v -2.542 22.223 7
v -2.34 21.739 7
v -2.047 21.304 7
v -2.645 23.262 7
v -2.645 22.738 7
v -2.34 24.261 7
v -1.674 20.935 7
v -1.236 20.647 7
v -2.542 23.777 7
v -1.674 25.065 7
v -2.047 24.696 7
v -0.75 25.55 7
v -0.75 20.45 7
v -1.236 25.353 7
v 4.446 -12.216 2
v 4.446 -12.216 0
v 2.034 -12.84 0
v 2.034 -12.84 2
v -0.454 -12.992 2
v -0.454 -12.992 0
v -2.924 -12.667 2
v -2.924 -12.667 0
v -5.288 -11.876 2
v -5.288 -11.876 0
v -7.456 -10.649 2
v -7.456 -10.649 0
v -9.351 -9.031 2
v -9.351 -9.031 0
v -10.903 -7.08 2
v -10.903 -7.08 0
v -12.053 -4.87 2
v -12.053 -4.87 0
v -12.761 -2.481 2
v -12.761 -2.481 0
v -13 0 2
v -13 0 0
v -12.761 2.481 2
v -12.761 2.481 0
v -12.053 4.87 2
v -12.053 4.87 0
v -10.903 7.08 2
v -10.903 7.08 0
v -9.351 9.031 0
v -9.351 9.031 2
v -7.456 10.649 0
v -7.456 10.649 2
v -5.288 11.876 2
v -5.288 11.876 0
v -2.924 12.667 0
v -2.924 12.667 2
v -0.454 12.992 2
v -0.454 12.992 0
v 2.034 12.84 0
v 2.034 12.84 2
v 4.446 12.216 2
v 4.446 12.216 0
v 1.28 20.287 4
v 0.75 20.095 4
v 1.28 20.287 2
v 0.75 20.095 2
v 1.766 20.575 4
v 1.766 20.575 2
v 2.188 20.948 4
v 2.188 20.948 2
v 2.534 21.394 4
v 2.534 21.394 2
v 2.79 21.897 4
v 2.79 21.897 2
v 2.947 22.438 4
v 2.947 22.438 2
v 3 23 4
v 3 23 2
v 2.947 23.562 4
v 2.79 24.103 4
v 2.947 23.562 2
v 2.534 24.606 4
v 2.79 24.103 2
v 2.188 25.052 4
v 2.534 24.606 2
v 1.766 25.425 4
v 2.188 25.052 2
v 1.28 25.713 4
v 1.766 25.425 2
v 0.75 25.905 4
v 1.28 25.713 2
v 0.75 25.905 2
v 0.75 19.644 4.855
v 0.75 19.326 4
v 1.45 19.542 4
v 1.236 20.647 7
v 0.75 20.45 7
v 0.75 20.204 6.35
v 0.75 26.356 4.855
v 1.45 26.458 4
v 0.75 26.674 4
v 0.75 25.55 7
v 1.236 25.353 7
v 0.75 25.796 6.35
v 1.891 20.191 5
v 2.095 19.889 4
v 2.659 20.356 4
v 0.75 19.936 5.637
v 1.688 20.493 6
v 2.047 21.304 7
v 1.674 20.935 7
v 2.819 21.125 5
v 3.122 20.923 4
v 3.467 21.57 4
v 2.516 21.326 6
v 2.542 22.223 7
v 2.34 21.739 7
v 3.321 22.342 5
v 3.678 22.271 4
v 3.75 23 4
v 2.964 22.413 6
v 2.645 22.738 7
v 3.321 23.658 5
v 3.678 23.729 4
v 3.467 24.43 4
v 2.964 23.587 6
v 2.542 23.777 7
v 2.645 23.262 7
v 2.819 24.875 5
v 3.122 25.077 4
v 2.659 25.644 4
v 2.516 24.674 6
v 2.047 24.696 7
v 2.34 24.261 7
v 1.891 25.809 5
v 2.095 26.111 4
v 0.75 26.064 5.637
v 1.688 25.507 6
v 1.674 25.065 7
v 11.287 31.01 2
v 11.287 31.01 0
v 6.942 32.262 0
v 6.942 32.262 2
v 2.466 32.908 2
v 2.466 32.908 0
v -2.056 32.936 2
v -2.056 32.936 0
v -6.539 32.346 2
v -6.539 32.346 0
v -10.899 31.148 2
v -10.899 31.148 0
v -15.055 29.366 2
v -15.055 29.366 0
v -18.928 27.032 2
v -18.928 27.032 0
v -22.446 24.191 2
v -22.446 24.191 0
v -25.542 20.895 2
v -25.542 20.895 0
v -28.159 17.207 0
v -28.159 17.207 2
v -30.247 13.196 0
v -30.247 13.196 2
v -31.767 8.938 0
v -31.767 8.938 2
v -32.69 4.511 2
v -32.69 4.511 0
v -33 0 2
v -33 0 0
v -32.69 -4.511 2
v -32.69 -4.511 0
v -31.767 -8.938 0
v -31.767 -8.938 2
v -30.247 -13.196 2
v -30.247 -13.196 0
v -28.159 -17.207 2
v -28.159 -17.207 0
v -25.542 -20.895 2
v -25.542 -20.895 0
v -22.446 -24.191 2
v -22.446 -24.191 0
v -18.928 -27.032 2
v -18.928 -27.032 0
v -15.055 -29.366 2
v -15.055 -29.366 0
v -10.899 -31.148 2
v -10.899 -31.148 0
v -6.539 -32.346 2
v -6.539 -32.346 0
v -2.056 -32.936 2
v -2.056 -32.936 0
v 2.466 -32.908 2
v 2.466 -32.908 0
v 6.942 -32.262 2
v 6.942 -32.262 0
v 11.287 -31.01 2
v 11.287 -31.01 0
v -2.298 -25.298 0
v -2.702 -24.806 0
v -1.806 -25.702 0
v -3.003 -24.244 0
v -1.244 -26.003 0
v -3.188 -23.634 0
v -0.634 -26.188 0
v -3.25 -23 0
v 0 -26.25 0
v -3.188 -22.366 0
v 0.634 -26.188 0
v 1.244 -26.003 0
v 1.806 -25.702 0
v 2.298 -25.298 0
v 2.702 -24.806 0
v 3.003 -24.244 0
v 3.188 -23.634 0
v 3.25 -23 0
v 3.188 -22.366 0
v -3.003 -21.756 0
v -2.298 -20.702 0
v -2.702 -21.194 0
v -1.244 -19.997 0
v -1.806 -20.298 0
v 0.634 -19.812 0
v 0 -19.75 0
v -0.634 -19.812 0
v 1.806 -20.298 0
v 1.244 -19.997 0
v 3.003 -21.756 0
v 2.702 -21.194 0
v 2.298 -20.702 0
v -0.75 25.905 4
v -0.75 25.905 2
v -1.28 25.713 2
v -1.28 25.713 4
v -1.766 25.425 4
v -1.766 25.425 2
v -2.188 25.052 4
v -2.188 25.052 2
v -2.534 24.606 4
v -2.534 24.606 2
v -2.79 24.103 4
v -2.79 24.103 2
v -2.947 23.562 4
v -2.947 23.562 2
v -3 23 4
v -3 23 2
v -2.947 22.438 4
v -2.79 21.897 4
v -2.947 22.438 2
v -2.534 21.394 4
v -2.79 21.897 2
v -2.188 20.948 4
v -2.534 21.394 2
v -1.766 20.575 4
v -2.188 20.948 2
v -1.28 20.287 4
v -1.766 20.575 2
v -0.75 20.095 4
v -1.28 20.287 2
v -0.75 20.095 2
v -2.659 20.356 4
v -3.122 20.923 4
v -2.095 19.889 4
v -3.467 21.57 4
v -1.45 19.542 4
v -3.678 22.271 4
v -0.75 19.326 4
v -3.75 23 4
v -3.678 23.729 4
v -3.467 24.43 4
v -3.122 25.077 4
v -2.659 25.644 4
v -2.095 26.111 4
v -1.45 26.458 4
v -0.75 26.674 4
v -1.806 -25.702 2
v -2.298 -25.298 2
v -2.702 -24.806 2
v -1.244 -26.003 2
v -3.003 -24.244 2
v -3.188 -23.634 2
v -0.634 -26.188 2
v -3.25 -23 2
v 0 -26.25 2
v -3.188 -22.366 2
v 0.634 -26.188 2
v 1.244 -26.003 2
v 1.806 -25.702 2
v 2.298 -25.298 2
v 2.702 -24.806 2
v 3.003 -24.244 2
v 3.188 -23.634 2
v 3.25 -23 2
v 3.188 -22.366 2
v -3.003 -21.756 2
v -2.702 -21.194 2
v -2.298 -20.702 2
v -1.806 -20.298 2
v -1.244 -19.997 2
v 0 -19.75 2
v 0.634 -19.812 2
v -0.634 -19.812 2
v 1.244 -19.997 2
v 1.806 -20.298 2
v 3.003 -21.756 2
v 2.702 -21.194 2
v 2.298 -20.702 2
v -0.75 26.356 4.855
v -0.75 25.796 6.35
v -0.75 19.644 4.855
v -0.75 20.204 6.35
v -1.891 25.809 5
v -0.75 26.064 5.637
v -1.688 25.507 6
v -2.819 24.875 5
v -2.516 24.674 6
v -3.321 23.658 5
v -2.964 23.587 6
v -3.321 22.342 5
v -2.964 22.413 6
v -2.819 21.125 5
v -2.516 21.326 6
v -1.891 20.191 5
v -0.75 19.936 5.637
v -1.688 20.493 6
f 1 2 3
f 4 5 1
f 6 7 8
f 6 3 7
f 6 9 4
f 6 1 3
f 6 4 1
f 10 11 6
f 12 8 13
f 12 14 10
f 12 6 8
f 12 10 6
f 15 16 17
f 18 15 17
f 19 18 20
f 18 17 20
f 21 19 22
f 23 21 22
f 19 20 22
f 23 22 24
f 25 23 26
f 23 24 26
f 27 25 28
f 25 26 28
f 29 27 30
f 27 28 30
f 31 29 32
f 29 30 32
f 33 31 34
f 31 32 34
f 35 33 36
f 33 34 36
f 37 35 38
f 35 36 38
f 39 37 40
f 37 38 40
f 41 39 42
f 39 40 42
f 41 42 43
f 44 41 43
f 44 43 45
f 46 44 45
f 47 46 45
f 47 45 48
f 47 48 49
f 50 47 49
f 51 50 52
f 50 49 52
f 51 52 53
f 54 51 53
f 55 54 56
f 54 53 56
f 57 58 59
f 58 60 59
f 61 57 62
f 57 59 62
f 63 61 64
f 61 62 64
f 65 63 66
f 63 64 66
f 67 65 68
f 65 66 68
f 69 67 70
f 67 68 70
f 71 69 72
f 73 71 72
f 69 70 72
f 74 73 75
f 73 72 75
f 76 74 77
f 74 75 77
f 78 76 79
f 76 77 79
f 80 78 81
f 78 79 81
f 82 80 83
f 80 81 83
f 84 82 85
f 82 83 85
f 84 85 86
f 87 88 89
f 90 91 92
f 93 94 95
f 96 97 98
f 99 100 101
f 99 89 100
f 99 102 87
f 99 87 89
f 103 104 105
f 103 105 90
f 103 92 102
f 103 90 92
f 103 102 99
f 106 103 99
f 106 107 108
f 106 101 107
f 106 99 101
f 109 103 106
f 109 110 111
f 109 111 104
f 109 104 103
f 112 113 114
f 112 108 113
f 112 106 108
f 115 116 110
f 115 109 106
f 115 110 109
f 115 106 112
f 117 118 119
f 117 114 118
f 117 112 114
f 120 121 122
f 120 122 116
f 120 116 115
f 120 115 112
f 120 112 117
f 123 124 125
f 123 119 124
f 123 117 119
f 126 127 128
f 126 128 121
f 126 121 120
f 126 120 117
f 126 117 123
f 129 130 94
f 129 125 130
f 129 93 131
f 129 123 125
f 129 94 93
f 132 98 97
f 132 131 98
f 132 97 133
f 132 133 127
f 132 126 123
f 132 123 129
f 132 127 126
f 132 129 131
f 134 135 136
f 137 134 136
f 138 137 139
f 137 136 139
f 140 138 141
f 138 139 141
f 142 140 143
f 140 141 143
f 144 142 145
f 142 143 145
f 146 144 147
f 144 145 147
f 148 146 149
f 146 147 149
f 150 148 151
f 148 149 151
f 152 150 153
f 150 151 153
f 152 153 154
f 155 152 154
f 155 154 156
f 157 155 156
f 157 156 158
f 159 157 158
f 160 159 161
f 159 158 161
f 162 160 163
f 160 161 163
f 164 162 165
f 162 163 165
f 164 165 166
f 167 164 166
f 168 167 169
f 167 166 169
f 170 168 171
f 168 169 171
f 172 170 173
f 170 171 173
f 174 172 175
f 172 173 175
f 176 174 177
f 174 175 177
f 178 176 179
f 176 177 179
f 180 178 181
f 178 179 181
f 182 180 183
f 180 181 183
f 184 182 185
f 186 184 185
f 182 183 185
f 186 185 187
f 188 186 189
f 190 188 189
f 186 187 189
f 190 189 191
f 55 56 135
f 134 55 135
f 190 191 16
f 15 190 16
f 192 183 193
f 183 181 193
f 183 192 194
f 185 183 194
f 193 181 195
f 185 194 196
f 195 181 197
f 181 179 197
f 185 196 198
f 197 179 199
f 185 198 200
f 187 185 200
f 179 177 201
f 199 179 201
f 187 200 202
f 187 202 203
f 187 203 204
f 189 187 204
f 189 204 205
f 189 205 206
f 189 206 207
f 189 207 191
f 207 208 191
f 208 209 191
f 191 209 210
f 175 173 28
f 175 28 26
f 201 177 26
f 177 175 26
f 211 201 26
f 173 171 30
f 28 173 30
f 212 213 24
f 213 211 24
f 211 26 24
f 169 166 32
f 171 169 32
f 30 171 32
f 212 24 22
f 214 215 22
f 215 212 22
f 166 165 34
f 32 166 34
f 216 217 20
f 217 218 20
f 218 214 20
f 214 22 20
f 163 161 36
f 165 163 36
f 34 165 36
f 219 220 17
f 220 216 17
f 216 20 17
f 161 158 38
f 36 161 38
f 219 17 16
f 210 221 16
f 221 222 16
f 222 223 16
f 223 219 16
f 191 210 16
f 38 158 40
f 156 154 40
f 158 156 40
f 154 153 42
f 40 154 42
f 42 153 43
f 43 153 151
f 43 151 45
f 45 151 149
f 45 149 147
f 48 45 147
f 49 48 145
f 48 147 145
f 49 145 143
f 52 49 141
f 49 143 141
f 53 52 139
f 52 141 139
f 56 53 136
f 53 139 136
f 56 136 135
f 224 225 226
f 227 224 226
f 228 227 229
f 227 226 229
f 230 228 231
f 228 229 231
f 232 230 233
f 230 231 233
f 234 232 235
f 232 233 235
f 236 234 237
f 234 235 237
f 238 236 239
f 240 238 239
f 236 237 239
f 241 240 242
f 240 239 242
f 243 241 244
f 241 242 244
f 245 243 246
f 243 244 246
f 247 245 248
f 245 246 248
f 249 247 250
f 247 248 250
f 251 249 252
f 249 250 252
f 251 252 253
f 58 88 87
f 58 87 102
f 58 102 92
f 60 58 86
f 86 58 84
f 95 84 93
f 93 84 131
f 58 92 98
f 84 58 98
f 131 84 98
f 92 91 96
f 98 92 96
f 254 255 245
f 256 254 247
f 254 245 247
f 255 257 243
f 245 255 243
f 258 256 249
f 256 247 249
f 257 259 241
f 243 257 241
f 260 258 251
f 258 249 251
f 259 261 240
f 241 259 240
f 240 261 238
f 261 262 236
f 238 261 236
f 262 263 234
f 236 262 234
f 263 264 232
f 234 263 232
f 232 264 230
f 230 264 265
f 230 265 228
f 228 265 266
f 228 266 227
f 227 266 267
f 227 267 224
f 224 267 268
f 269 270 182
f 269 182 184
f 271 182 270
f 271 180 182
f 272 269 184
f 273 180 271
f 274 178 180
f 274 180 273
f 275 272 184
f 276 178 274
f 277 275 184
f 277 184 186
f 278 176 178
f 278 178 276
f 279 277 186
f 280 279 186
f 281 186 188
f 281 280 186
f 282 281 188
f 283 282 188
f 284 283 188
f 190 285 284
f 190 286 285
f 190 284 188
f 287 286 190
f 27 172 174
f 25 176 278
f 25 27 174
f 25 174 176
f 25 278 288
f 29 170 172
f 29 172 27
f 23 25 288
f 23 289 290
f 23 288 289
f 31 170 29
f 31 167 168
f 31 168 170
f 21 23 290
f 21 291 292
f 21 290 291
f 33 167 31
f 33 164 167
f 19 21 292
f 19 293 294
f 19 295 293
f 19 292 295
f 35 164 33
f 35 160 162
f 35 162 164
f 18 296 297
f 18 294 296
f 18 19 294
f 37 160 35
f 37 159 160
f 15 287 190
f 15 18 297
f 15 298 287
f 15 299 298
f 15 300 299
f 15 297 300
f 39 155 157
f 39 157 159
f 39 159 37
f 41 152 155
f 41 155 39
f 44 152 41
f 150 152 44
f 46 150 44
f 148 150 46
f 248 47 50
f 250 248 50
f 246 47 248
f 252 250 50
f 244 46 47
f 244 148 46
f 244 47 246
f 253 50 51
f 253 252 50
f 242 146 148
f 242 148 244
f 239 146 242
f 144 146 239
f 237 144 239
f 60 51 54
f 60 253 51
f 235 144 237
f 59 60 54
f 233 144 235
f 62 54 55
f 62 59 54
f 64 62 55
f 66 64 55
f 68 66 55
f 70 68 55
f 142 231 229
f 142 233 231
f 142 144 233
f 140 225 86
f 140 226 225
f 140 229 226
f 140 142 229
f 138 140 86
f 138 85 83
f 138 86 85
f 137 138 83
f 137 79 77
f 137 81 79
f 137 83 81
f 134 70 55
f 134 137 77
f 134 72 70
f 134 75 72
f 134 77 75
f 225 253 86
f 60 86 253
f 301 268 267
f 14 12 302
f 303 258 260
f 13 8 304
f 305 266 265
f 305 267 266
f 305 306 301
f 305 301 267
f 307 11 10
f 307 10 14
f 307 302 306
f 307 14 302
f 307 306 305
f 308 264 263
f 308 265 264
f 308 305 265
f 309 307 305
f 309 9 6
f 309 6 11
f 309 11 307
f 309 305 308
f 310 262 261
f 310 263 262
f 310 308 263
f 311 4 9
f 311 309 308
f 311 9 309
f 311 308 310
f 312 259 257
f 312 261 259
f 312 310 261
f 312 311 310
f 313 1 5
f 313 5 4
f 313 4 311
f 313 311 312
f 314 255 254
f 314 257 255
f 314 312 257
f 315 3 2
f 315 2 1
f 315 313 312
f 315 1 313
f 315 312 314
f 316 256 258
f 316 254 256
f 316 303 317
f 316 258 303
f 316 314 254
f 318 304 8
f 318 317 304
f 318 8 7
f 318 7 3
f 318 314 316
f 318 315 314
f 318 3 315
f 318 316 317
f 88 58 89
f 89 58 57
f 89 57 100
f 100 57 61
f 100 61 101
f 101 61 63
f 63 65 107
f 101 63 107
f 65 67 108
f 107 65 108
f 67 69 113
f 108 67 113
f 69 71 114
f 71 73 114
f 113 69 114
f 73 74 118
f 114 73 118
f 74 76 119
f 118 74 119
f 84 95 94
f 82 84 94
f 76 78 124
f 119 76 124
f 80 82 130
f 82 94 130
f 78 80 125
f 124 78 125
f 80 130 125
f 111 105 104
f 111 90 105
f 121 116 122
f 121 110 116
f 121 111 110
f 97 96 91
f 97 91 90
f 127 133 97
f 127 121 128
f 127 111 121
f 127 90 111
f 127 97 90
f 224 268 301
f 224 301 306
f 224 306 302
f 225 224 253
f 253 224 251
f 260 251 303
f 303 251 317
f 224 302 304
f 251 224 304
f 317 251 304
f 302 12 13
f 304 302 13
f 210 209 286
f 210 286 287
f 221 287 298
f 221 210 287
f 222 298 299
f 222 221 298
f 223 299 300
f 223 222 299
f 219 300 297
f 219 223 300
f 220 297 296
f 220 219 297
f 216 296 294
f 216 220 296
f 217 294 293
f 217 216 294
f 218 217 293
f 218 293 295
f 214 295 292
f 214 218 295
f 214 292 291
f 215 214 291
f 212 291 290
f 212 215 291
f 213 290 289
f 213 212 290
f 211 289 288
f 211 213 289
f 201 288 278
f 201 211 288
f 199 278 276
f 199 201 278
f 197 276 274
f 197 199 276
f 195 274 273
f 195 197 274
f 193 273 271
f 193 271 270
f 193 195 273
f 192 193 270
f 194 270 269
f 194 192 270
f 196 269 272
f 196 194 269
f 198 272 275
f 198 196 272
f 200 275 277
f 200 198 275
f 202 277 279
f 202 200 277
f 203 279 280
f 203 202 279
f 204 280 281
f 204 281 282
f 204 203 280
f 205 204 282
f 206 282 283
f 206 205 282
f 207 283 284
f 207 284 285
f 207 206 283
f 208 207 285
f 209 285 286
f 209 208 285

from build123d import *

# Parameters (mm, degrees)
F0_R     = 3.25
F0_R_2   = 3
F1_DEPTH = 2
F2_DEPTH = 4
F3_R     = 3.75
F3_R_2   = 3
F4_DEPTH = 3
F4_TAPER = 20
F6_DEPTH = 5


with BuildPart() as f1:
    # F0 (on Top) → F1 (new body)
    with BuildSketch(Plane.XY):
        with BuildLine():
            ThreePointArc((4.4462618632, -12.2160040702), (-13, 0), (4.4462618632, 12.2160040702))
            Line((4.4462618632, 12.2160040702), (11.2866647297, 31.0098564859))
            ThreePointArc((11.2866647297, 31.0098564859), (-33, 0), (11.2866647297, -31.0098564859))
            Line((11.2866647297, -31.0098564859), (4.4462618632, -12.2160040702))
        make_face()
        with Locations((0, -23)):
            Circle(F0_R, mode=Mode.SUBTRACT)
        with Locations((0, 23)):
            Circle(F0_R_2, mode=Mode.SUBTRACT)
    extrude(amount=F1_DEPTH)

    # F0 (on Top) → F2 (join)
    with BuildSketch(Plane.XY):
        with Locations((0, 23)):
            Circle(F0_R_2)
    extrude(amount=F2_DEPTH)

    # F3 (on face) → F4 (join)
    with BuildSketch(Plane.XY.offset(4)):
        with Locations((0, 23)):
            Circle(F3_R)
        with Locations((0, 23)):
            Circle(F3_R_2, mode=Mode.SUBTRACT)
        with Locations((0, 23)):
            Circle(F3_R_2)
    extrude(amount=F4_DEPTH, taper=F4_TAPER)

    # F5 (on face) → F6 (cut)
    with BuildSketch(Plane.XY.offset(7)):
        with BuildLine():
            ThreePointArc((0.75, 20.4499139795), (0, 20.3419107028), (-0.75, 20.4499139795))
            Line((-0.75, 20.4499139795), (-0.75, 18.6920836568))
            Line((-0.75, 18.6920836568), (0.75, 18.7304485589))
            Line((0.75, 18.7304485589), (0.75, 20.4499139795))
        make_face()
        with BuildLine():
            ThreePointArc((0.75, 25.5500860205), (0, 25.6580892972), (-0.75, 25.5500860205))
            Line((-0.75, 25.5500860205), (-0.75, 20.4499139795))
            ThreePointArc((-0.75, 20.4499139795), (0, 20.3419107028), (0.75, 20.4499139795))
            Line((0.75, 20.4499139795), (0.75, 25.5500860205))
        make_face()
        with BuildLine():
            Line((-0.75, 27.6506636292), (-0.75, 25.5500860205))
            ThreePointArc((-0.75, 25.5500860205), (0, 25.6580892972), (0.75, 25.5500860205))
            Line((0.75, 25.5500860205), (0.75, 27.6890285313))
            Line((0.75, 27.6890285313), (-0.75, 27.6506636292))
        make_face()
    extrude(amount=-F6_DEPTH, mode=Mode.SUBTRACT)


solid = f1.part
